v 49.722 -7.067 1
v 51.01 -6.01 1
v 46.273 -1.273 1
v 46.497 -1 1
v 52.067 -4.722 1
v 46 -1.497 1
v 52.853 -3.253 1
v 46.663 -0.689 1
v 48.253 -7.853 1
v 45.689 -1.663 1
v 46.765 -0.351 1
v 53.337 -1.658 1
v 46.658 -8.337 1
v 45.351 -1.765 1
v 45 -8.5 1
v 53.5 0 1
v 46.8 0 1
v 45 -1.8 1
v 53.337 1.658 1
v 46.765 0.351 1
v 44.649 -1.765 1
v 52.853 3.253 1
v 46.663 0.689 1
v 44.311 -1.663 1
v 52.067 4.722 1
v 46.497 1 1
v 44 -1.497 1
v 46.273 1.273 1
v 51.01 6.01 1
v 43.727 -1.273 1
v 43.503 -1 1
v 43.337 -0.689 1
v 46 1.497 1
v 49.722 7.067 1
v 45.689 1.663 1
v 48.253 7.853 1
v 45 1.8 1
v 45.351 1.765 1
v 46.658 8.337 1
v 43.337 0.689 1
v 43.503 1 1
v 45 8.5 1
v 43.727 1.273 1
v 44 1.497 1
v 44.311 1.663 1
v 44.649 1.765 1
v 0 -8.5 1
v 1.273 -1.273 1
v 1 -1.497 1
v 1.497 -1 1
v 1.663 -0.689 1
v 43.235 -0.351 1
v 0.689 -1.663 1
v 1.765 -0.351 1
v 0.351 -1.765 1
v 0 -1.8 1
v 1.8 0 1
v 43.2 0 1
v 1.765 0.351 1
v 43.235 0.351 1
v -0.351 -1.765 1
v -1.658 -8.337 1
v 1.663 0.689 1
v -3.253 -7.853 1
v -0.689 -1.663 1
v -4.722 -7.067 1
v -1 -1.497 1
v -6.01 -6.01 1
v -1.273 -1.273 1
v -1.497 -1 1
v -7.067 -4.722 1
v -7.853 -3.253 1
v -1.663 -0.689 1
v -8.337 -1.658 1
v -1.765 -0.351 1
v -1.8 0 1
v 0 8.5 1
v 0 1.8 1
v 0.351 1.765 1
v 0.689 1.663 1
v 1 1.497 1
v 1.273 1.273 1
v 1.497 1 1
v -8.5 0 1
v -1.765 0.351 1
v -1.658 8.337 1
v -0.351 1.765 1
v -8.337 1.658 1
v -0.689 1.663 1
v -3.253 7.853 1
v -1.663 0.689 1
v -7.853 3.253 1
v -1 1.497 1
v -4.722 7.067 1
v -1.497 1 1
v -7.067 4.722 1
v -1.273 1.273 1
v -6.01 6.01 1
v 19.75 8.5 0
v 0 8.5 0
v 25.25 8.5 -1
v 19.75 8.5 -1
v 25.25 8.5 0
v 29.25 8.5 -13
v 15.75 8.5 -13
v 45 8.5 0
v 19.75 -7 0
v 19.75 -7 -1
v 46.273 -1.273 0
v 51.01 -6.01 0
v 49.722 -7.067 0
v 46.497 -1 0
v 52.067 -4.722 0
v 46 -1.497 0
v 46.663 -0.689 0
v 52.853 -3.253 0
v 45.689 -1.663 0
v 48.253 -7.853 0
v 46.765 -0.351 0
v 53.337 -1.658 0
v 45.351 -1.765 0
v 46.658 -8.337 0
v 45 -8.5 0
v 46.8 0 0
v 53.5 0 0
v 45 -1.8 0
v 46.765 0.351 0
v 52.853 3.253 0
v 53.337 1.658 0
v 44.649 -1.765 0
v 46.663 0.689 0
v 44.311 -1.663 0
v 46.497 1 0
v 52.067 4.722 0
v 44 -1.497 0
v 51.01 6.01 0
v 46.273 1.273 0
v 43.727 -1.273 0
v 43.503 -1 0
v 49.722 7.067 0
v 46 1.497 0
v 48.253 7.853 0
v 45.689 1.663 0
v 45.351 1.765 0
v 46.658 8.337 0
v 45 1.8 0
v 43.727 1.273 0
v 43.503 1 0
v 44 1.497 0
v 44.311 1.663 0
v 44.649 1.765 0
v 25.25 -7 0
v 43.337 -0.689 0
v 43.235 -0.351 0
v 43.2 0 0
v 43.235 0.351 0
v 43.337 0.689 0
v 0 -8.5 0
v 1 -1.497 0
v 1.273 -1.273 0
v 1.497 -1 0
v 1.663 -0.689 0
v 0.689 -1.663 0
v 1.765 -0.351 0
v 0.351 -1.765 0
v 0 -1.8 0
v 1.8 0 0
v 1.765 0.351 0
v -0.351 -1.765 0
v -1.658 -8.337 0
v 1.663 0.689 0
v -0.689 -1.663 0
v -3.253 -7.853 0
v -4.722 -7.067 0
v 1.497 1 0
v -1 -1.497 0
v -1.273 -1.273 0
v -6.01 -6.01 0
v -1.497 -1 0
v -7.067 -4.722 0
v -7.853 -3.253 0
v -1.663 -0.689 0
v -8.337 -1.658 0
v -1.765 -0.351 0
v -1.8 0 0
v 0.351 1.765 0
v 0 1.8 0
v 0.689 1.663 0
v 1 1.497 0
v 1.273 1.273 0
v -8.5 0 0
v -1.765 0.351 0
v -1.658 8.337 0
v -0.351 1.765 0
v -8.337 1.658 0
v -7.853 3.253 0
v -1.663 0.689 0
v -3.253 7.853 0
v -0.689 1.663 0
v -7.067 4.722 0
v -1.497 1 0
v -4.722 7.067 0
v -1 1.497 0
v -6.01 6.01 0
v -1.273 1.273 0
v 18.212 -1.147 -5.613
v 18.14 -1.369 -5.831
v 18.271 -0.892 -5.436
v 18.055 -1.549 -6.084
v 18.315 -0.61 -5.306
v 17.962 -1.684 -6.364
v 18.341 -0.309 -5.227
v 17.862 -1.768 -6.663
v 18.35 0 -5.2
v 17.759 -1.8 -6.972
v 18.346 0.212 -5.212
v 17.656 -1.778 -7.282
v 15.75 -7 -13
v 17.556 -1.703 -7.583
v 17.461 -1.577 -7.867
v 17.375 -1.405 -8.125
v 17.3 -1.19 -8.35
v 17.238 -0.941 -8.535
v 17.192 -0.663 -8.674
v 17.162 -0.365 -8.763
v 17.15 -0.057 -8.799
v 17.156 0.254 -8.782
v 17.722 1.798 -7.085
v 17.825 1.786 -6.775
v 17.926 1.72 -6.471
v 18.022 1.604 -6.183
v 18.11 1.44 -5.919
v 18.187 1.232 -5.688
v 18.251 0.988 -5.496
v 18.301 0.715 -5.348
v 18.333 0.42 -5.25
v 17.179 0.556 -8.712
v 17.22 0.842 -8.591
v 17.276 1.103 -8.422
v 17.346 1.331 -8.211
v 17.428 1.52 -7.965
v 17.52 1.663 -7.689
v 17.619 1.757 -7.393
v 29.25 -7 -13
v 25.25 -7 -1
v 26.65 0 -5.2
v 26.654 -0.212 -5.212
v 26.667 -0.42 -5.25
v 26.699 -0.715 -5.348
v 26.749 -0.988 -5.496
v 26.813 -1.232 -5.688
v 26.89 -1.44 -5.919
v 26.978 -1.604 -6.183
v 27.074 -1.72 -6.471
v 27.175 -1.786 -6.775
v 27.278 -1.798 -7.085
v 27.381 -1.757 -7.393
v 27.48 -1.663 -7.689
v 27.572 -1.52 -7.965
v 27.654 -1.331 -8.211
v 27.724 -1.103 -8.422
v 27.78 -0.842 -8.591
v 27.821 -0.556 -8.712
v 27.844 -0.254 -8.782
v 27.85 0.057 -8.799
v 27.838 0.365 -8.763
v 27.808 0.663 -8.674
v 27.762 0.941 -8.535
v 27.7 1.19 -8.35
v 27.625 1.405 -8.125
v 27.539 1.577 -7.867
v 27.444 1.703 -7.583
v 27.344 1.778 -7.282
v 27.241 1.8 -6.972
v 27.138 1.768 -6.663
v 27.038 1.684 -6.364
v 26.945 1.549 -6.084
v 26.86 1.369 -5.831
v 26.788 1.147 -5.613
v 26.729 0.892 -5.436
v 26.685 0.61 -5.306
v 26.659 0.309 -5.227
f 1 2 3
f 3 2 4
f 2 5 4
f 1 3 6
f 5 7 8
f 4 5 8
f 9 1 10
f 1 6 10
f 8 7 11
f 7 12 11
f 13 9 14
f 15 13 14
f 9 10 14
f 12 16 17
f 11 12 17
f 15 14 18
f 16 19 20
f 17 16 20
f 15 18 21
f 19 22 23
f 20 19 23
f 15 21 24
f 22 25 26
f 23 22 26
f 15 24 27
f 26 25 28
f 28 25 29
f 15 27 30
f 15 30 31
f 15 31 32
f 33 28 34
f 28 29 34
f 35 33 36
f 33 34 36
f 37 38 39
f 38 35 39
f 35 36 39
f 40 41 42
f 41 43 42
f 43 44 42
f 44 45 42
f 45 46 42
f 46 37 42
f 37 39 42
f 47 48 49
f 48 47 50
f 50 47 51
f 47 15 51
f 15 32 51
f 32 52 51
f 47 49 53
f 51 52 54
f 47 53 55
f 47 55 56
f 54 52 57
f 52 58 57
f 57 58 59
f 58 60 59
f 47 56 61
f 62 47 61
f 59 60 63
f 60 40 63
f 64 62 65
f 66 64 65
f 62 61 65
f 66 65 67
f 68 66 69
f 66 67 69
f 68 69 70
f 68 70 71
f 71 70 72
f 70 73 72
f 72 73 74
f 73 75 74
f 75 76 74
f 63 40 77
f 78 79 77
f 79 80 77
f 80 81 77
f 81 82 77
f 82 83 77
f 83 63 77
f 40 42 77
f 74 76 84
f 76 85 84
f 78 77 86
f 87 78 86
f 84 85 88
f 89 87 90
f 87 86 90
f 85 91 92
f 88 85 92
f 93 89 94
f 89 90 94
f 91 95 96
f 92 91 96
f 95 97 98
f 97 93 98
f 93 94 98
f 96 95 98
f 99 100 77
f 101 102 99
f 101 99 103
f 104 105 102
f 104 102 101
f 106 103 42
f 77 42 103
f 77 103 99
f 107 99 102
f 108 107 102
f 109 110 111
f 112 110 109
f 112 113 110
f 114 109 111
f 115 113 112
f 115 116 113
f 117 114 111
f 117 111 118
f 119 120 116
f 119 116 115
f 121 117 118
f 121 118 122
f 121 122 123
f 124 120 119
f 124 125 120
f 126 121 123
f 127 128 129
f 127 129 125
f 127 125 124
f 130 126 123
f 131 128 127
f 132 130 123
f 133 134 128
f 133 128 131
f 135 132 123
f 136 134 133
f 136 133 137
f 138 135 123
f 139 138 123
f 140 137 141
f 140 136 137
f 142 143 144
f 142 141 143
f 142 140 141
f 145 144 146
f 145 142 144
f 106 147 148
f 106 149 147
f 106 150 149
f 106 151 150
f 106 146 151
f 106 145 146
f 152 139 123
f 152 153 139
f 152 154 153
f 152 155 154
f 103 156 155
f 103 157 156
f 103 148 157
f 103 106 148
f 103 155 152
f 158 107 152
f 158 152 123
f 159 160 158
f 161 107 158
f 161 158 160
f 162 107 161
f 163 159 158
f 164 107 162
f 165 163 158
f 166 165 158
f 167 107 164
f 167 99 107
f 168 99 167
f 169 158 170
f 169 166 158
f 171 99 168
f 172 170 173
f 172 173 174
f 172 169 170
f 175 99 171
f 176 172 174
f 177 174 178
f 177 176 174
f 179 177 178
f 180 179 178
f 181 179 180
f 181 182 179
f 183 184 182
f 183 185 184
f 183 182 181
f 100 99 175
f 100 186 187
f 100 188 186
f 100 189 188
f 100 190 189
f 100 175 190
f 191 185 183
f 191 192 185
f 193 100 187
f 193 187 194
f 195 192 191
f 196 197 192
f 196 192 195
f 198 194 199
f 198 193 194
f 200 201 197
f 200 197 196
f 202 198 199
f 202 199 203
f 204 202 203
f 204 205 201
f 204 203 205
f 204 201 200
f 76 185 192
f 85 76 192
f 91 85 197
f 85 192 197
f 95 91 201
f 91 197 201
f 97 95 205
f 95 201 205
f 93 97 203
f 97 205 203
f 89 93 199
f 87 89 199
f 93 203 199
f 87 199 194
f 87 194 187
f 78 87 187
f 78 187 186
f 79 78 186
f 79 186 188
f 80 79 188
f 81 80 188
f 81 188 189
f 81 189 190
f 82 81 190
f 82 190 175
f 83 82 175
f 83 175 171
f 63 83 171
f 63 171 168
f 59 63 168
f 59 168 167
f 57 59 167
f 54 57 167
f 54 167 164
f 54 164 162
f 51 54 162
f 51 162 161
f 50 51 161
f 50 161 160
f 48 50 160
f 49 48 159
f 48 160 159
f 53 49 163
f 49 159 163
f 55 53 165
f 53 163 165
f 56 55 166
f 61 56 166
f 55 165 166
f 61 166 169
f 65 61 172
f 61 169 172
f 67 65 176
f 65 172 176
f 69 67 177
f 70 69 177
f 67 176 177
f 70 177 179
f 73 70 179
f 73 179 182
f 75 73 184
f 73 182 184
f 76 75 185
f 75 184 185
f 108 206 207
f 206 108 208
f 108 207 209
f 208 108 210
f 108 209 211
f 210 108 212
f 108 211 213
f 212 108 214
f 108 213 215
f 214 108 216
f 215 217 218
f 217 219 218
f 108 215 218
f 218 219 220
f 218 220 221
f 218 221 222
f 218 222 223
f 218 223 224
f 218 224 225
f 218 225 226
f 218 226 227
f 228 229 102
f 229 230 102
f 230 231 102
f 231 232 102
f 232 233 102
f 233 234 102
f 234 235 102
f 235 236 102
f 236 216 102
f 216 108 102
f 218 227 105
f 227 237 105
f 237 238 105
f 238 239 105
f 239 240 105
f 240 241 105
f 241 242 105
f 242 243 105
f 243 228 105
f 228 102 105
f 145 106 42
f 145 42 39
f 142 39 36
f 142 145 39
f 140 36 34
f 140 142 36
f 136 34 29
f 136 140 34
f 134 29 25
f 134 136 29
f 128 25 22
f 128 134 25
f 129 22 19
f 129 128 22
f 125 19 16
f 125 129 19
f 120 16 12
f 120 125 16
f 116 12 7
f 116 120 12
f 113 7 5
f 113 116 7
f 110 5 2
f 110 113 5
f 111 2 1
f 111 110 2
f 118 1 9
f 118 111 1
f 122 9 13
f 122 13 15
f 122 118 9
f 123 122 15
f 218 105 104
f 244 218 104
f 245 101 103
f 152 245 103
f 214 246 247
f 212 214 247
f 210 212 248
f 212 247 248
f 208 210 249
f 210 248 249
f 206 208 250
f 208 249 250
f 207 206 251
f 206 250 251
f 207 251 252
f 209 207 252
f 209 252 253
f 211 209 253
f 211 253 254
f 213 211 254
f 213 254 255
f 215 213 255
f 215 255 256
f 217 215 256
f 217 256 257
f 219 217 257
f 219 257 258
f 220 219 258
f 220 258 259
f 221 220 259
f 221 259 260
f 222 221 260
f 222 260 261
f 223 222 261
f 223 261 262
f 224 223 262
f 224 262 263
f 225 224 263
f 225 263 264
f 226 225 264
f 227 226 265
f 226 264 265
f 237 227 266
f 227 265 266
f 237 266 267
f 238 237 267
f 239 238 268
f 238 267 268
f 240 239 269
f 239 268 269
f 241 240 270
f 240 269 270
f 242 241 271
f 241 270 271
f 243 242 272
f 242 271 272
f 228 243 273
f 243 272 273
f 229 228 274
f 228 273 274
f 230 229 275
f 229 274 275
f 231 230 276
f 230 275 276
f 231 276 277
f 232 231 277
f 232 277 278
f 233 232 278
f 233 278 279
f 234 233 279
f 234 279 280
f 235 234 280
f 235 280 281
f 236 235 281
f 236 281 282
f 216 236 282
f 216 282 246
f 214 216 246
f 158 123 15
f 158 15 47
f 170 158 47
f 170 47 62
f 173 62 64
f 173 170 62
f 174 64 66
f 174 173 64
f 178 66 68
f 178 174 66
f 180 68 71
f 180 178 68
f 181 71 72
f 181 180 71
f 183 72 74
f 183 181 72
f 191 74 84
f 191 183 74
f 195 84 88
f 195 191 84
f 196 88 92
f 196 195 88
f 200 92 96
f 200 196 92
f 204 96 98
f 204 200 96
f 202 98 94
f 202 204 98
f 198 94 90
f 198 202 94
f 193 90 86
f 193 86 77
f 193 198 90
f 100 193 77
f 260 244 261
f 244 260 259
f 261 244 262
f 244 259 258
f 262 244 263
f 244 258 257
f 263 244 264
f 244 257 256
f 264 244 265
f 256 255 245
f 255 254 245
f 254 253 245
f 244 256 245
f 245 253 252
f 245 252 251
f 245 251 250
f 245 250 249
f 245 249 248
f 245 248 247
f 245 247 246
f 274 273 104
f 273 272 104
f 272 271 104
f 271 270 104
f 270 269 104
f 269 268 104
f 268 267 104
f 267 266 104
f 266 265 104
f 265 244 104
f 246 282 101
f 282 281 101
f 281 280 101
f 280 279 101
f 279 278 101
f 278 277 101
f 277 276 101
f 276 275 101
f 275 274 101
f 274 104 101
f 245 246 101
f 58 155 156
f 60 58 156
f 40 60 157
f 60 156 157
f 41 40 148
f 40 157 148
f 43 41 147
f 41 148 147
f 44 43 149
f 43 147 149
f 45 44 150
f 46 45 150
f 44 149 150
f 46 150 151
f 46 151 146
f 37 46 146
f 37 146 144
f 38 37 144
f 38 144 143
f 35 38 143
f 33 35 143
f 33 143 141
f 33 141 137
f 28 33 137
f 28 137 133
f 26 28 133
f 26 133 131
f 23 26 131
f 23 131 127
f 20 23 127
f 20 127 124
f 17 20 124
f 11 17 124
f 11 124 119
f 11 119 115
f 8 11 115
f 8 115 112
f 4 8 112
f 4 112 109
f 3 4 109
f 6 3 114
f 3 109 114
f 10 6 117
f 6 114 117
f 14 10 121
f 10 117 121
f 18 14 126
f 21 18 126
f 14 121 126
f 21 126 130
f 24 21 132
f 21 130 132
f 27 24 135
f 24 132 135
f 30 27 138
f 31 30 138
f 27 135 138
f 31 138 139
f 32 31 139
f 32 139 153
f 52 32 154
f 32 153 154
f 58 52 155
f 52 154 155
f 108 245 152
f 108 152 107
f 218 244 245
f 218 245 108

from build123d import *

# Parameters (mm, degrees)
BOSS_EXTRUDE1_DEPTH      = 1
M3_CLEARANCE_HOLE1_D     = 3.6
M3_CLEARANCE_HOLE1_DEPTH = 1
BOSS_EXTRUDE2_DEPTH      = 15.5
M3_CLEARANCE_HOLE2_D     = 3.6


with BuildPart() as part:
    # Sketch1 → Boss-Extrude1 (new body)
    with BuildSketch(Plane.XY):
        with BuildLine():
            Line((0, 8.5), (45, 8.5))
            ThreePointArc((45, 8.5), (53.5, 0), (45, -8.5))
            Line((45, -8.5), (0, -8.5))
            ThreePointArc((0, -8.5), (-8.5, 0), (0, 8.5))
        make_face()
    extrude(amount=BOSS_EXTRUDE1_DEPTH)

    # M3 Clearance Hole1
    with Locations(Plane.XY.offset(1)):
        with Locations((0, 0), (45, 0)):
            Hole(M3_CLEARANCE_HOLE1_D / 2, depth=M3_CLEARANCE_HOLE1_DEPTH)

    # Sketch4 → Boss-Extrude2 (add)
    with BuildSketch(Plane(origin=(0, 8.5, 0), x_dir=(1, 0, 0), z_dir=(0, 1, 0))):
        Polygon((19.75, 0), (19.75, 1), (15.75, 13), (29.25, 13), (25.25, 1), (25.25, 0), align=None)
    extrude(amount=-BOSS_EXTRUDE2_DEPTH)

    # M3 Clearance Hole2 (through all)
    with Locations(Plane(origin=(0, 0, 0), x_dir=(0, 0, -1), z_dir=(-1, 0, 0))):
        with Locations((7, 0)):
            Hole(M3_CLEARANCE_HOLE2_D / 2)


solid = part.part
